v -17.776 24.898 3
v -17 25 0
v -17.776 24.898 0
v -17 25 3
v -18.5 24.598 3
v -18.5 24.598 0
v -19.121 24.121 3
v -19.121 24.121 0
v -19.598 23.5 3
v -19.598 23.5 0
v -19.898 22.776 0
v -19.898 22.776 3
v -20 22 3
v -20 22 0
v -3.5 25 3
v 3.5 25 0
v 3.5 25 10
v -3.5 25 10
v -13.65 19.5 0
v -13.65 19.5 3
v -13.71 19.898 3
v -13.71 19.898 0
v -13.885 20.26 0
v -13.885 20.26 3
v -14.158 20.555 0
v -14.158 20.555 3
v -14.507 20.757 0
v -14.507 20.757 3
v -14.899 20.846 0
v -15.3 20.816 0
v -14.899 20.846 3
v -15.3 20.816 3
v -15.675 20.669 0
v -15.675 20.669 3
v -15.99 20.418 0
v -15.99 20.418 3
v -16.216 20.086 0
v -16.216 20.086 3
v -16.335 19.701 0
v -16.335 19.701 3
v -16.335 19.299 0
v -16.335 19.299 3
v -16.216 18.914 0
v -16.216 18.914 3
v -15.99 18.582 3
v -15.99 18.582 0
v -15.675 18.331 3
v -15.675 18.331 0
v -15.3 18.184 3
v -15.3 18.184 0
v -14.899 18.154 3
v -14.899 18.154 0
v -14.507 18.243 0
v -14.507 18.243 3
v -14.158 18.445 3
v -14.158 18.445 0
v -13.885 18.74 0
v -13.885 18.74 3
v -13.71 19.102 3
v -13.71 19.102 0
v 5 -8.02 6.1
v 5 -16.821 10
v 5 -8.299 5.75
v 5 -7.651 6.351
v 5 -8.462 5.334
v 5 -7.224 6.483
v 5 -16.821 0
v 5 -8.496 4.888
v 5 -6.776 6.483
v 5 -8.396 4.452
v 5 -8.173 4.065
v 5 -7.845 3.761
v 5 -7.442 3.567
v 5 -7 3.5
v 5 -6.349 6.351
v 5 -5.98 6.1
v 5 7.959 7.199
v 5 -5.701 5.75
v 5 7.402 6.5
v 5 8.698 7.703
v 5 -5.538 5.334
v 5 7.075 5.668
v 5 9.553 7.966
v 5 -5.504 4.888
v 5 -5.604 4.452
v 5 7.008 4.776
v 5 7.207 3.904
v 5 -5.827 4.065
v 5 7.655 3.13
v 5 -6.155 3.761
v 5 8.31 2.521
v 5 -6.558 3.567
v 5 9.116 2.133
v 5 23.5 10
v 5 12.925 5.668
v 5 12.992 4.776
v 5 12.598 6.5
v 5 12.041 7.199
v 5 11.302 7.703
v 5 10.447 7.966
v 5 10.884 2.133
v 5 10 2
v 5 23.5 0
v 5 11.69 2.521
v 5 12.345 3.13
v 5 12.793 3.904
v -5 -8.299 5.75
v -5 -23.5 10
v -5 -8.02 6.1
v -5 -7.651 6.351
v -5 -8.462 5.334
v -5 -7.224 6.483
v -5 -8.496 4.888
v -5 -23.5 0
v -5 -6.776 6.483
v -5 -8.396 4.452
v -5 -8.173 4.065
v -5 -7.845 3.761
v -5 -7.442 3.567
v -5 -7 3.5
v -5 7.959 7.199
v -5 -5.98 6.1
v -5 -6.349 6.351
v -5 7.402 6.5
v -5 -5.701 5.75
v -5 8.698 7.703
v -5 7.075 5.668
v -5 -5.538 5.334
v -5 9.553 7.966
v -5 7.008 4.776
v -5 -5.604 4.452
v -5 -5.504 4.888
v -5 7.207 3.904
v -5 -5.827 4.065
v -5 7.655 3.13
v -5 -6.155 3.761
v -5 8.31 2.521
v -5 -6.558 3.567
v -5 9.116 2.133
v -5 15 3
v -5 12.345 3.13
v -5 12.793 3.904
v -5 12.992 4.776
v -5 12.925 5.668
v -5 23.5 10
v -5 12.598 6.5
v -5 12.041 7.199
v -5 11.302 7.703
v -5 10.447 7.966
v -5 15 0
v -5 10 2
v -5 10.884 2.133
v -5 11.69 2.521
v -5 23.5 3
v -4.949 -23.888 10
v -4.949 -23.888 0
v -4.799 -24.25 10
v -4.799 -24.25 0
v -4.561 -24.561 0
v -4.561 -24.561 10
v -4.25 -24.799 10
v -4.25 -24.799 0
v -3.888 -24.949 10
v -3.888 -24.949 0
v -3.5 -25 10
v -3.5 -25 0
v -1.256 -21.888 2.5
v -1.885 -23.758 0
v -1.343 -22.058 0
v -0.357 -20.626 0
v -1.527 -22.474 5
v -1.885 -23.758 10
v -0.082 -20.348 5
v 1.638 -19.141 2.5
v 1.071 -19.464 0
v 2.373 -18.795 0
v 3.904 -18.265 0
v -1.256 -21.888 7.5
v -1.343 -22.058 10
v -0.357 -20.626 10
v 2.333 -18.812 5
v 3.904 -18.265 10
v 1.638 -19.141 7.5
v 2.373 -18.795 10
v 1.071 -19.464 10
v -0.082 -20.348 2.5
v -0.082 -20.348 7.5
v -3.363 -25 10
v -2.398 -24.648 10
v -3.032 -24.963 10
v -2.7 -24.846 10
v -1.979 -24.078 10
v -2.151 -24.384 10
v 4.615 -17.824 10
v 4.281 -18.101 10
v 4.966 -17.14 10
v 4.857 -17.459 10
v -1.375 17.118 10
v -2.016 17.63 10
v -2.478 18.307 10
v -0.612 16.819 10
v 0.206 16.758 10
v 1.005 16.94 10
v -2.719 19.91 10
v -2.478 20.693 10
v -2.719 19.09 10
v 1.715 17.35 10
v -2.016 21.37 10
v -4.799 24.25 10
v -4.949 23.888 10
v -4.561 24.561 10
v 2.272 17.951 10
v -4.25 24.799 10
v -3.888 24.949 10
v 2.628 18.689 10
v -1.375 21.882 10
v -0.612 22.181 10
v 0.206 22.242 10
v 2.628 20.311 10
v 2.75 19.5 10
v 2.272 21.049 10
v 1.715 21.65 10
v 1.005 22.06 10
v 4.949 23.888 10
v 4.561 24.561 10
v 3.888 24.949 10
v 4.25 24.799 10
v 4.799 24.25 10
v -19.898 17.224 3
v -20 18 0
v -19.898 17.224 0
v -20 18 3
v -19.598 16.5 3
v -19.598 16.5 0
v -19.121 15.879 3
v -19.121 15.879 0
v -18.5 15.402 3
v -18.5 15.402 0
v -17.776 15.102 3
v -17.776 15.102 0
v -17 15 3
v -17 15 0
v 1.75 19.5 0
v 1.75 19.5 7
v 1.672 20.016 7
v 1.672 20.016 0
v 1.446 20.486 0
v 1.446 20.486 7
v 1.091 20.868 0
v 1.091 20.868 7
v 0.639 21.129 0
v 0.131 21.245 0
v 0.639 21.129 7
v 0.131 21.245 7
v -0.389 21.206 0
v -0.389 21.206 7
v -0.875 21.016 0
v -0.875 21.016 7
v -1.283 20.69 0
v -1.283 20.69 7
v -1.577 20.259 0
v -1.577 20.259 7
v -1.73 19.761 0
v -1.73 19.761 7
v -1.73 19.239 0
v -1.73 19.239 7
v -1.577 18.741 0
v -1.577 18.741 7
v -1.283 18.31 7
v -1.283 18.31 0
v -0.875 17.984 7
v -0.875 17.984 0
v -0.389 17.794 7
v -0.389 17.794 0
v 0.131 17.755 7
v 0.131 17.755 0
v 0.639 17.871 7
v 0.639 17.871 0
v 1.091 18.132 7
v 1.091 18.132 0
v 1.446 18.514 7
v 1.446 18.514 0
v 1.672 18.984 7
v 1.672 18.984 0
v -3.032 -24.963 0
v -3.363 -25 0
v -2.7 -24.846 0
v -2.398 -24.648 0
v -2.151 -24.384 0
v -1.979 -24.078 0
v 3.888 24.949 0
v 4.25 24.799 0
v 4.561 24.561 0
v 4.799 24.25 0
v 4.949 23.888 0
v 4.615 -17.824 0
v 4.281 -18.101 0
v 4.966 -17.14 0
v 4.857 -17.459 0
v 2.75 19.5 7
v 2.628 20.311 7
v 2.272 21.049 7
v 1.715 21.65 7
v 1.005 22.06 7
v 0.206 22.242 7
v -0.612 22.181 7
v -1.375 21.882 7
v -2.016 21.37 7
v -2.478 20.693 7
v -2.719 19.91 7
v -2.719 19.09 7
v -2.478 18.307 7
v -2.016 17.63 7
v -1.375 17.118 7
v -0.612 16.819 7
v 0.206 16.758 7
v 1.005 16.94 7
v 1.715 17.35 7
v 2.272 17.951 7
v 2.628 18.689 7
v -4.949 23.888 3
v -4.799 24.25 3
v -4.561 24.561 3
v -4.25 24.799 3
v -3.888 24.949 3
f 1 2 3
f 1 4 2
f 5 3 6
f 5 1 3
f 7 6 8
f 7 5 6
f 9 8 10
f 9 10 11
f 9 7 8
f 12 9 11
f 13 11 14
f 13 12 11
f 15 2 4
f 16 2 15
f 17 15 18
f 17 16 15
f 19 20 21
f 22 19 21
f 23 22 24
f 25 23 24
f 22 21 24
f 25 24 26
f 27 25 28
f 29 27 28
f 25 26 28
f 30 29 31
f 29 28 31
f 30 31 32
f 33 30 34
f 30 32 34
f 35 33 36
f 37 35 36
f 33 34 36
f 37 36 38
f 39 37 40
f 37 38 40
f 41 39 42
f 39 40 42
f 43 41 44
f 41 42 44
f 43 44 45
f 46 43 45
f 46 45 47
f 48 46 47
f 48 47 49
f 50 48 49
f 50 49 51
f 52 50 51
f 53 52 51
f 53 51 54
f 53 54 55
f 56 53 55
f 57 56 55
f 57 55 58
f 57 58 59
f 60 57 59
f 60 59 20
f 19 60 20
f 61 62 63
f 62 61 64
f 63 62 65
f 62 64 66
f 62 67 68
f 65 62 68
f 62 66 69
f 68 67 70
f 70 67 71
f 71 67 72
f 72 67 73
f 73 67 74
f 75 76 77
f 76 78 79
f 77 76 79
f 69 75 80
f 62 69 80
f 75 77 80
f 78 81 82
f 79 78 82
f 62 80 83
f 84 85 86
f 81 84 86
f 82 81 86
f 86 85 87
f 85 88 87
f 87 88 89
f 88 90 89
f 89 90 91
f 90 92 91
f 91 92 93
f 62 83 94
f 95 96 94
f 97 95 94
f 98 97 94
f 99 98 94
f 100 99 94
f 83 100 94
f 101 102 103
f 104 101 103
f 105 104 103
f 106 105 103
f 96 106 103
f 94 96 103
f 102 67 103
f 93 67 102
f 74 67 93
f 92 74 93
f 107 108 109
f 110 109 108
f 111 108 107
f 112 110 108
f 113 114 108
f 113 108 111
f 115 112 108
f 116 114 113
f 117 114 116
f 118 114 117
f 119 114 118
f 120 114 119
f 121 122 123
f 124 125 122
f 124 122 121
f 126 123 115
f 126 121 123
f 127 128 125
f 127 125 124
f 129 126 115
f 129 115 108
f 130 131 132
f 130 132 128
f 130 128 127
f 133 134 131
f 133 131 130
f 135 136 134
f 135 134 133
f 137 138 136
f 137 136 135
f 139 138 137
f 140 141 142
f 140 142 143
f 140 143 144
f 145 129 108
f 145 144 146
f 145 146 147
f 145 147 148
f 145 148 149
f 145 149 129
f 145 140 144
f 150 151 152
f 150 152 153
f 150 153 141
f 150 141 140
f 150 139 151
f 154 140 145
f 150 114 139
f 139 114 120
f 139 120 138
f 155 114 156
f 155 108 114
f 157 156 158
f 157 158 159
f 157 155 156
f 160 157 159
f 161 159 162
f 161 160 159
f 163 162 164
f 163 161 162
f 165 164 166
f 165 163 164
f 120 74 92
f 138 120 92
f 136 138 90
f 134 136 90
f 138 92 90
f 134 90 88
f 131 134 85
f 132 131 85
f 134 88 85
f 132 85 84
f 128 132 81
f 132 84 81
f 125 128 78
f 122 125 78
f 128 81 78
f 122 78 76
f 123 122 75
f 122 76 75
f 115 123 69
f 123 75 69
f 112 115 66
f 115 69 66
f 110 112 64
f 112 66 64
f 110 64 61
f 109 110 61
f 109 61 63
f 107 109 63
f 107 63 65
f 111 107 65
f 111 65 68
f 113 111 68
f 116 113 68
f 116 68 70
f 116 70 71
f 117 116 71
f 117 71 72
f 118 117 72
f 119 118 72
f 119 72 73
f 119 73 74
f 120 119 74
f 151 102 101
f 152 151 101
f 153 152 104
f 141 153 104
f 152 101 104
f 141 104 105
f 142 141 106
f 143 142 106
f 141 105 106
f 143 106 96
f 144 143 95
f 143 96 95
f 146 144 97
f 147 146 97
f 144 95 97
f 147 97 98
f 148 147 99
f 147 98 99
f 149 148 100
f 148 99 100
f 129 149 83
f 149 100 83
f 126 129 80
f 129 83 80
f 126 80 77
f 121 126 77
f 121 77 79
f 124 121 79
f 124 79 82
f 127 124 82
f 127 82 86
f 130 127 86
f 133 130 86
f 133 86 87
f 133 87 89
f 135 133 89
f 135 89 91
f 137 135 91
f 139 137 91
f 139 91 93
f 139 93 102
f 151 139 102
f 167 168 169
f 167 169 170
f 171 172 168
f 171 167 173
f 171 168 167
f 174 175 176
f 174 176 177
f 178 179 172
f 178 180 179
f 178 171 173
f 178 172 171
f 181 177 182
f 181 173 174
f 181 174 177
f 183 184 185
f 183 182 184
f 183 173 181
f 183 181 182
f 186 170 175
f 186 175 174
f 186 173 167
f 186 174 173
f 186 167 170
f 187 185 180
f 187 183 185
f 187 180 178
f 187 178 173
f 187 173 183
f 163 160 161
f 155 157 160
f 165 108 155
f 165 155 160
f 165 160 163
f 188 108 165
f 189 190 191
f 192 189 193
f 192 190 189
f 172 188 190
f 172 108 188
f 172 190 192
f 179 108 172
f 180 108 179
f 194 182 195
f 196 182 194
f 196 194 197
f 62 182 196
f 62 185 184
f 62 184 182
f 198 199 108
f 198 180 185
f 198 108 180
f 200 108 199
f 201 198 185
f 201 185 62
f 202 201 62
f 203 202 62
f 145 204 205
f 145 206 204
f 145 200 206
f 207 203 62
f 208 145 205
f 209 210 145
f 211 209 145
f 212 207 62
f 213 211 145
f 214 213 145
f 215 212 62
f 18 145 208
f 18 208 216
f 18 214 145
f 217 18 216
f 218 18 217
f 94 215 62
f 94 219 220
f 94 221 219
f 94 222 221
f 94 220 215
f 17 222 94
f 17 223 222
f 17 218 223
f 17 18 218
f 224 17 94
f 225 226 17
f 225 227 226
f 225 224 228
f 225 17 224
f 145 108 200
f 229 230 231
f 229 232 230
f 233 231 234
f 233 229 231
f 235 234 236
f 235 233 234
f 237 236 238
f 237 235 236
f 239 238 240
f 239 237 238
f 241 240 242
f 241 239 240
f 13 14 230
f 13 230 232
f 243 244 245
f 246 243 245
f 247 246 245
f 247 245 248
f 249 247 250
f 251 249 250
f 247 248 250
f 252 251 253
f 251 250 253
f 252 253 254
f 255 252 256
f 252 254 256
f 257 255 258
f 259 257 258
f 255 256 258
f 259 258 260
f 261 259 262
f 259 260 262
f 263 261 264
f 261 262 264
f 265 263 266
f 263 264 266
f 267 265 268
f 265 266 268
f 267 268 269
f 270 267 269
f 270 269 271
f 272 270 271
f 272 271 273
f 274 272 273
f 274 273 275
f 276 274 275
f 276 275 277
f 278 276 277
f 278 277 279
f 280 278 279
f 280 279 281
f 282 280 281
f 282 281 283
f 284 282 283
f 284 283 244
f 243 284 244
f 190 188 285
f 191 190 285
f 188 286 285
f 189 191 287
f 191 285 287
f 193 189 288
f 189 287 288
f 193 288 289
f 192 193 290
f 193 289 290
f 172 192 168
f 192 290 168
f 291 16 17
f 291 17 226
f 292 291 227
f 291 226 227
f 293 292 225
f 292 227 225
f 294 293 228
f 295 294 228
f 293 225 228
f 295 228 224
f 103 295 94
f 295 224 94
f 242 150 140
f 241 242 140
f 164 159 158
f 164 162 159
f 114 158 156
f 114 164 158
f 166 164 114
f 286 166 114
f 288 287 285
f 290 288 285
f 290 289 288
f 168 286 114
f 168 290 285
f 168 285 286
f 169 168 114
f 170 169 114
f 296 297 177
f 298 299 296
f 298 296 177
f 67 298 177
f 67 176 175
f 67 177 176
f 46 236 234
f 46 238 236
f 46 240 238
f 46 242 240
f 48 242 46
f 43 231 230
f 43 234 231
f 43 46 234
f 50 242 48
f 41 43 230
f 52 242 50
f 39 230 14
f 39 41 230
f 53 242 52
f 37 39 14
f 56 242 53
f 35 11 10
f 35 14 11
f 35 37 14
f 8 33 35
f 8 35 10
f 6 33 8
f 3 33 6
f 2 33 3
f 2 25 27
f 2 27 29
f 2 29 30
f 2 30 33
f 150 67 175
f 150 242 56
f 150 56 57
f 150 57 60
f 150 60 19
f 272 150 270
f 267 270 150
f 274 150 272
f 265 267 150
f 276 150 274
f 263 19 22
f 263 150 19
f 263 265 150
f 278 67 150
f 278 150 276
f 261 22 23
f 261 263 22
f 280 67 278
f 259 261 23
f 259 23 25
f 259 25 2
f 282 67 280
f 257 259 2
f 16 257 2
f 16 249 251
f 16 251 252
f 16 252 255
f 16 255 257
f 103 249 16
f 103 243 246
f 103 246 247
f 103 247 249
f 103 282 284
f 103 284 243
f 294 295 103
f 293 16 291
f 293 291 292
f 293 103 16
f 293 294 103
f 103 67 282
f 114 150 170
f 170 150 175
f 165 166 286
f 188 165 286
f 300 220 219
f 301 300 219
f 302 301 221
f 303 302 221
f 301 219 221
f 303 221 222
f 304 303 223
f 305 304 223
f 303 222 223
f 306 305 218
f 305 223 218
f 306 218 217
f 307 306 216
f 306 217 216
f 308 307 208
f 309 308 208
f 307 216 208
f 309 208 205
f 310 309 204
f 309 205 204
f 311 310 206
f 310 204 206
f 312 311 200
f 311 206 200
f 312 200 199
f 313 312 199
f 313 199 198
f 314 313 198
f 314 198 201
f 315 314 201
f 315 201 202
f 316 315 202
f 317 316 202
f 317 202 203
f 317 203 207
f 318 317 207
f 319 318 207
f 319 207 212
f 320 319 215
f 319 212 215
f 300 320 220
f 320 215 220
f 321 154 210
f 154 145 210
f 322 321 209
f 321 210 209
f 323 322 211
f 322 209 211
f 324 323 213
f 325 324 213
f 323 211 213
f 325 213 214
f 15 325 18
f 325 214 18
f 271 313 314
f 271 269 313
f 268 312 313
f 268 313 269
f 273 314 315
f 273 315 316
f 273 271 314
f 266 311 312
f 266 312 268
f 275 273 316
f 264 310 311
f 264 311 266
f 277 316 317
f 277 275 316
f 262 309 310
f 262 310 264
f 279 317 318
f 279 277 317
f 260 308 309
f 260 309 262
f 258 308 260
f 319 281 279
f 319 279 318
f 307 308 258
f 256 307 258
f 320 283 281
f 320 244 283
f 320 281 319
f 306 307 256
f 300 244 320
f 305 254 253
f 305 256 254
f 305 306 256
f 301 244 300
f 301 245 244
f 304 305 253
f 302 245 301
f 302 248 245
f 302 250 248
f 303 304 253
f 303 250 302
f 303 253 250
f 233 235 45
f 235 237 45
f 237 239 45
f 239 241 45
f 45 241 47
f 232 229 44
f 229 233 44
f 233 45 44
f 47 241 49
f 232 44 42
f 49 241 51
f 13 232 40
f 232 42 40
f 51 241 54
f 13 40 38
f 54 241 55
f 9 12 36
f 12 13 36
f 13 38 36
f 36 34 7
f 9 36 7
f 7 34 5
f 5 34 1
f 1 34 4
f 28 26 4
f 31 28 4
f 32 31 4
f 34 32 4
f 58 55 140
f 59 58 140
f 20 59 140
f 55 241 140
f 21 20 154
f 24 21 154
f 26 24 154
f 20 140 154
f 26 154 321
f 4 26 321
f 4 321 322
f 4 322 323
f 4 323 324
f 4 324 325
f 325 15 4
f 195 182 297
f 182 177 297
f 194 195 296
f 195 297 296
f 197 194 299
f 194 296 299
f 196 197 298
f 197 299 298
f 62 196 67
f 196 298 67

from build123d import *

# Parameters (mm, degrees)
SKETCH1_W           = 10
SKETCH1_H           = 50
BOSS_EXTRUDE1_DEPTH = 10
SKETCH2_R           = 1.75
CUT_EXTRUDE1_DEPTH  = 10
CUT_EXTRUDE2_DEPTH  = 10
FILLET1_R           = 1.5
SKETCH4_R           = 2.75
CUT_EXTRUDE3_DEPTH  = 3
SKETCH5_R           = 3
CUT_EXTRUDE4_DEPTH  = 13
SKETCH6_W           = 3
SKETCH6_H           = 10
BOSS_EXTRUDE2_DEPTH = 15
FILLET2_R           = 3
FILLET3_R           = 1.5
SKETCH7_R           = 1.35
CUT_EXTRUDE5_DEPTH  = 15
SKETCH8_R           = 1.5
CUT_EXTRUDE6_DEPTH  = 15


with BuildPart() as part:
    # Sketch1 → Boss-Extrude1 (new body)
    with BuildSketch(Plane.XY):
        Rectangle(SKETCH1_W, SKETCH1_H)
    extrude(amount=BOSS_EXTRUDE1_DEPTH)

    # Sketch2 → Cut-Extrude1 (cut)
    with BuildSketch(Plane.XY.offset(10)):
        with Locations((0, 19.5)):
            Circle(SKETCH2_R)
    extrude(amount=-CUT_EXTRUDE1_DEPTH, mode=Mode.SUBTRACT)

    # Sketch3 → Cut-Extrude2 (cut)
    with BuildSketch(Plane.XY.offset(10)):
        with BuildLine():
            Line((5, -18), (5, -25))
            Line((5, -25), (-2, -25))
            add(Edge.make_bspline(
                [(-2, -25), (-1.904224842, -19.430935455), (5, -18)],
                knots=[0, 0, 0, 1, 1, 1], degree=2))
        make_face()
    extrude(amount=-CUT_EXTRUDE2_DEPTH, mode=Mode.SUBTRACT)

    # Fillet1
    fillet1_edges = [part.edges().sort_by_distance(p)[0] for p in [
        (5, -18, 5),
        (-2, -25, 5),
        (-5, -25, 5),
        (5, 25, 5),
    ]]
    fillet(fillet1_edges, radius=FILLET1_R)

    # Sketch4 → Cut-Extrude3 (cut)
    with BuildSketch(Plane.XY.offset(10)):
        with Locations((0, 19.5)):
            Circle(SKETCH4_R)
    extrude(amount=-CUT_EXTRUDE3_DEPTH, mode=Mode.SUBTRACT)

    # Sketch5 → Cut-Extrude4 (cut)
    with BuildSketch(Plane(origin=(5, 0, 0), x_dir=(0, 0, -1), z_dir=(1, 0, 0))):
        with Locations((-5, 10)):
            Circle(SKETCH5_R)
    extrude(amount=-CUT_EXTRUDE4_DEPTH, mode=Mode.SUBTRACT)

    # Sketch6 → Boss-Extrude2 (add)
    with BuildSketch(Plane.ZY.offset(5)):
        with Locations((1.5, 20)):
            Rectangle(SKETCH6_W, SKETCH6_H)
    extrude(amount=BOSS_EXTRUDE2_DEPTH)

    # Fillet2
    fillet2_edges = [part.edges().sort_by_distance(p)[0] for p in [
        (-20, 15, 1.5),
        (-20, 25, 1.5),
    ]]
    fillet(fillet2_edges, radius=FILLET2_R)

    # Fillet3
    fillet3_edges = [part.edges().sort_by_distance(p)[0] for p in [
        (-5, 25, 6.5),
    ]]
    fillet(fillet3_edges, radius=FILLET3_R)

    # Sketch7 → Cut-Extrude5 (cut)
    with BuildSketch(Plane.XY.offset(3)):
        with Locations((-15, 19.5)):
            Circle(SKETCH7_R)
    extrude(amount=-CUT_EXTRUDE5_DEPTH, mode=Mode.SUBTRACT)

    # Sketch8 → Cut-Extrude6 (cut)
    with BuildSketch(Plane(origin=(5, 0, 0), x_dir=(0, 0, -1), z_dir=(1, 0, 0))):
        with Locations((-5, -7)):
            Circle(SKETCH8_R)
    extrude(amount=-CUT_EXTRUDE6_DEPTH, mode=Mode.SUBTRACT)


solid = part.part
